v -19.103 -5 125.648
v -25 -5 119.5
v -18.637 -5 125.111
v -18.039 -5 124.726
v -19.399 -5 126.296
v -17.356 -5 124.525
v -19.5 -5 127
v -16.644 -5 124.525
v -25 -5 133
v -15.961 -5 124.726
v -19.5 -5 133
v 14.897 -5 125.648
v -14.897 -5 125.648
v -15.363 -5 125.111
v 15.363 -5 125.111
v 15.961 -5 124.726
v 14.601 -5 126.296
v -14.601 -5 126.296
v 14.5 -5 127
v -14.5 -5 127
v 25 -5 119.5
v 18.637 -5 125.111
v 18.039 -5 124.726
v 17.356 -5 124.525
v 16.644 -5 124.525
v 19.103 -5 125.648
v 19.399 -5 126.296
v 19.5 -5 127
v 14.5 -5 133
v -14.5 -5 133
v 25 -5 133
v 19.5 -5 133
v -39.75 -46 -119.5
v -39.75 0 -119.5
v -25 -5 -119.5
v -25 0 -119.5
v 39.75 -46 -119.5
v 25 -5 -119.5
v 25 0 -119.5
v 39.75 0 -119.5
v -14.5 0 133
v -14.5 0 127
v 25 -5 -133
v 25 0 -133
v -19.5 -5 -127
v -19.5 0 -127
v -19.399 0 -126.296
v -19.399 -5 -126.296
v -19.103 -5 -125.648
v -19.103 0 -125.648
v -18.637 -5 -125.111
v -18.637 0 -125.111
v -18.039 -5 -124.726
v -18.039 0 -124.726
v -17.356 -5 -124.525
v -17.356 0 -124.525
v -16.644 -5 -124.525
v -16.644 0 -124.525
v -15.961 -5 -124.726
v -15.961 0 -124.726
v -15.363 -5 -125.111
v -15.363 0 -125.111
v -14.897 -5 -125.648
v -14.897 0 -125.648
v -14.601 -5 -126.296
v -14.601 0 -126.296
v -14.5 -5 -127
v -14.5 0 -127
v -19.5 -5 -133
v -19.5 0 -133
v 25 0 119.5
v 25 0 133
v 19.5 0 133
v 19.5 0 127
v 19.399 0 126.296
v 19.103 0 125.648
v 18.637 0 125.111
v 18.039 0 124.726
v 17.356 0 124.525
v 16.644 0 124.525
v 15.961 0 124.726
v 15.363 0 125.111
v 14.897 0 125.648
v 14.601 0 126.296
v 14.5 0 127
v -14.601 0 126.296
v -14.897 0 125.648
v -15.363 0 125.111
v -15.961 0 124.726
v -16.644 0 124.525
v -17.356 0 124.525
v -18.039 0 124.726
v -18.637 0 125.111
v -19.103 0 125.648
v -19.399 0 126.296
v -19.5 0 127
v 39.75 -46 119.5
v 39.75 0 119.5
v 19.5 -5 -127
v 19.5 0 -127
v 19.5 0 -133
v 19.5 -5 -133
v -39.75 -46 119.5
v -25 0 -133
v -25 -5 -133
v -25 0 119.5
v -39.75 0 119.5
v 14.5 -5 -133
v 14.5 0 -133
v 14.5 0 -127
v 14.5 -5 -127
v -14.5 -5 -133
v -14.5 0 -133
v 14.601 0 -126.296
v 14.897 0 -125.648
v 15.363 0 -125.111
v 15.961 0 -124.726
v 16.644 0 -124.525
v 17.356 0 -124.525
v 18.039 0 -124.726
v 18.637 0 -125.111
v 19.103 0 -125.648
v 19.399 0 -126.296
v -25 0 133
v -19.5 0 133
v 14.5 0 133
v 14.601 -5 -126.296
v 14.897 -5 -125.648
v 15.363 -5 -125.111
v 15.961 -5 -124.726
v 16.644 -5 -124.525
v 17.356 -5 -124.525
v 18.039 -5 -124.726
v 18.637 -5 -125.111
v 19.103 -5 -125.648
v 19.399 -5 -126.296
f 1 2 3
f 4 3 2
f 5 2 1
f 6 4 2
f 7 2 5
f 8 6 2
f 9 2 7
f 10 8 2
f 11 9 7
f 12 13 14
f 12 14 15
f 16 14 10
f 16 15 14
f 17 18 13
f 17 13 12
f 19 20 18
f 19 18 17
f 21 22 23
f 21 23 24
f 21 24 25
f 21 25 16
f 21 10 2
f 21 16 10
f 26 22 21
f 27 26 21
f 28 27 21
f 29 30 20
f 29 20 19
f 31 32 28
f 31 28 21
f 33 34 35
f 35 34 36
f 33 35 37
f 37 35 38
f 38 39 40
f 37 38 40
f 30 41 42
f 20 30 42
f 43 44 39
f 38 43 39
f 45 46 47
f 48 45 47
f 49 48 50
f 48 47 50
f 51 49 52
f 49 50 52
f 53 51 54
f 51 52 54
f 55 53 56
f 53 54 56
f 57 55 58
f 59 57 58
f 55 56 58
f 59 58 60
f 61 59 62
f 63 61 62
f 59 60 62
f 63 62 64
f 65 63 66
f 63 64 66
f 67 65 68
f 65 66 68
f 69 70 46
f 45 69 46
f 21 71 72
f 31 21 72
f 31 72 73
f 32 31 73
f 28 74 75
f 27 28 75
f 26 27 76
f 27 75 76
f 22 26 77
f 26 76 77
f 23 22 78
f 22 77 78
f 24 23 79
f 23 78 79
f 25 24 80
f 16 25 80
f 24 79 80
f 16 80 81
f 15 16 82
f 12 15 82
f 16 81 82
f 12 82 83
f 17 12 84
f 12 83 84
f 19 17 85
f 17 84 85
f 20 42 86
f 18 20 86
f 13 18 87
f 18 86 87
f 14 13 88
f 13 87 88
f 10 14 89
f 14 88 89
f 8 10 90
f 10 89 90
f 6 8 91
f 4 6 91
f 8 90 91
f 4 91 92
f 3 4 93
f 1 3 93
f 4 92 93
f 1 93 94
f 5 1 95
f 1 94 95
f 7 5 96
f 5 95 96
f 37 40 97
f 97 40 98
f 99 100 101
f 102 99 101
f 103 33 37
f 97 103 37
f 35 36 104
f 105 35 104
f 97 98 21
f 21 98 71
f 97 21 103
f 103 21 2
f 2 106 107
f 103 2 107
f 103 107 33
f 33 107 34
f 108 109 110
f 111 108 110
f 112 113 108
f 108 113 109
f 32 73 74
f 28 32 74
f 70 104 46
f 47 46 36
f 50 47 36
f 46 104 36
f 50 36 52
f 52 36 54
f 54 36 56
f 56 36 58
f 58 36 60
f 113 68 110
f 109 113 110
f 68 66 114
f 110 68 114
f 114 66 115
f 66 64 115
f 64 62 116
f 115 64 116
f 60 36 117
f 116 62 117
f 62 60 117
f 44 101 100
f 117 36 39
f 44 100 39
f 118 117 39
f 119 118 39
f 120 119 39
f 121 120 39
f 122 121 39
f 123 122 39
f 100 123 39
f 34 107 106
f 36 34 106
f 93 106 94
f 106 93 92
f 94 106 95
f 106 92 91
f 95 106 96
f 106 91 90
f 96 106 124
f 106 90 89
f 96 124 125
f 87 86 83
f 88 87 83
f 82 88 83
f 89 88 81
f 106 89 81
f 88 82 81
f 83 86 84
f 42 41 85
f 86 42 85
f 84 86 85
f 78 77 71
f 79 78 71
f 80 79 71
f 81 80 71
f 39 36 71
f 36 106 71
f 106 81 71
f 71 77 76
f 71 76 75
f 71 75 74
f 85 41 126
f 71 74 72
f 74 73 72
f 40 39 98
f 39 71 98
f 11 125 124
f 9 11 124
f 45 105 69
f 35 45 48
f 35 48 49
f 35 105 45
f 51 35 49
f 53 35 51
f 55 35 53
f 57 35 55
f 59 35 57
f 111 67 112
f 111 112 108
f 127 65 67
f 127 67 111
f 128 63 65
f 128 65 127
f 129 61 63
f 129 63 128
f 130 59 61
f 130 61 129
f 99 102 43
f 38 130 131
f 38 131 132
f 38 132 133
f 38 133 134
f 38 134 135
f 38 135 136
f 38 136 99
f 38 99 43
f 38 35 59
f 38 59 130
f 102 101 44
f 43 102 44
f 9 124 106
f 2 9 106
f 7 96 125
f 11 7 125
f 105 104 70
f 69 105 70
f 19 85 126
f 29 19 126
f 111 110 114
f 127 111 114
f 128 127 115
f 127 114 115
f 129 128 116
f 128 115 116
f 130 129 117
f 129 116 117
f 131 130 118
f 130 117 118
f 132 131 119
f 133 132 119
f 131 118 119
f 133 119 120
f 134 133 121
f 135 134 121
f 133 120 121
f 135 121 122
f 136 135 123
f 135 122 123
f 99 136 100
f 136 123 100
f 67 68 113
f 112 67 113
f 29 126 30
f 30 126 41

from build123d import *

# Parameters (mm, degrees)
F1_DEPTH = 5
F2_DEPTH = 46


with BuildPart() as f1:
    # F0 (on Front) → F1 (new body)
    with BuildSketch(Plane.XZ):
        with BuildLine():
            Line((0, 119.5), (25, 119.5))
            Line((25, 119.5), (25, 133))
            Line((25, 133), (19.5, 133))
            Line((19.5, 133), (19.5, 127))
            ThreePointArc((19.5, 127), (17, 124.5), (14.5, 127))
            Line((14.5, 127), (14.5, 133))
            Line((14.5, 133), (0, 133))
            Line((0, 133), (-14.5, 133))
            Line((-14.5, 133), (-14.5, 127))
            ThreePointArc((-14.5, 127), (-17, 124.5), (-19.5, 127))
            Line((-19.5, 127), (-19.5, 133))
            Line((-19.5, 133), (-25, 133))
            Line((-25, 133), (-25, 119.5))
            Line((-25, 119.5), (0, 119.5))
        make_face()
    extrude(amount=F1_DEPTH)



with BuildPart() as f1b:
    # F0 (on Front) → F1, piece 2 (new body)
    with BuildSketch(Plane.XZ):
        with BuildLine():
            Line((25, -133), (25, -119.5))
            Line((25, -119.5), (0, -119.5))
            Line((0, -119.5), (-25, -119.5))
            Line((-25, -119.5), (-25, -133))
            Line((-25, -133), (-19.5, -133))
            Line((-19.5, -133), (-19.5, -127))
            ThreePointArc((-19.5, -127), (-17, -124.5), (-14.5, -127))
            Line((-14.5, -127), (-14.5, -133))
            Line((-14.5, -133), (0, -133))
            Line((0, -133), (14.5, -133))
            Line((14.5, -133), (14.5, -127))
            ThreePointArc((14.5, -127), (17, -124.5), (19.5, -127))
            Line((19.5, -127), (19.5, -133))
            Line((19.5, -133), (25, -133))
        make_face()
    extrude(amount=F1_DEPTH)


with BuildPart() as f1_1:
    add(f1.part)

    add(f1b.part)  # F2 merges F1b
    # F0 (on Front) → F2 (join)
    with BuildSketch(Plane.XZ):
        Polygon((39.75, -119.5), (39.75, 0), (39.75, 119.5), (25, 119.5), (0, 119.5), (-25, 119.5), (-39.75, 119.5), (-39.75, 0), (-39.75, -119.5), (-25, -119.5), (0, -119.5), (25, -119.5), align=None)
    extrude(amount=F2_DEPTH)


solid = f1_1.part
